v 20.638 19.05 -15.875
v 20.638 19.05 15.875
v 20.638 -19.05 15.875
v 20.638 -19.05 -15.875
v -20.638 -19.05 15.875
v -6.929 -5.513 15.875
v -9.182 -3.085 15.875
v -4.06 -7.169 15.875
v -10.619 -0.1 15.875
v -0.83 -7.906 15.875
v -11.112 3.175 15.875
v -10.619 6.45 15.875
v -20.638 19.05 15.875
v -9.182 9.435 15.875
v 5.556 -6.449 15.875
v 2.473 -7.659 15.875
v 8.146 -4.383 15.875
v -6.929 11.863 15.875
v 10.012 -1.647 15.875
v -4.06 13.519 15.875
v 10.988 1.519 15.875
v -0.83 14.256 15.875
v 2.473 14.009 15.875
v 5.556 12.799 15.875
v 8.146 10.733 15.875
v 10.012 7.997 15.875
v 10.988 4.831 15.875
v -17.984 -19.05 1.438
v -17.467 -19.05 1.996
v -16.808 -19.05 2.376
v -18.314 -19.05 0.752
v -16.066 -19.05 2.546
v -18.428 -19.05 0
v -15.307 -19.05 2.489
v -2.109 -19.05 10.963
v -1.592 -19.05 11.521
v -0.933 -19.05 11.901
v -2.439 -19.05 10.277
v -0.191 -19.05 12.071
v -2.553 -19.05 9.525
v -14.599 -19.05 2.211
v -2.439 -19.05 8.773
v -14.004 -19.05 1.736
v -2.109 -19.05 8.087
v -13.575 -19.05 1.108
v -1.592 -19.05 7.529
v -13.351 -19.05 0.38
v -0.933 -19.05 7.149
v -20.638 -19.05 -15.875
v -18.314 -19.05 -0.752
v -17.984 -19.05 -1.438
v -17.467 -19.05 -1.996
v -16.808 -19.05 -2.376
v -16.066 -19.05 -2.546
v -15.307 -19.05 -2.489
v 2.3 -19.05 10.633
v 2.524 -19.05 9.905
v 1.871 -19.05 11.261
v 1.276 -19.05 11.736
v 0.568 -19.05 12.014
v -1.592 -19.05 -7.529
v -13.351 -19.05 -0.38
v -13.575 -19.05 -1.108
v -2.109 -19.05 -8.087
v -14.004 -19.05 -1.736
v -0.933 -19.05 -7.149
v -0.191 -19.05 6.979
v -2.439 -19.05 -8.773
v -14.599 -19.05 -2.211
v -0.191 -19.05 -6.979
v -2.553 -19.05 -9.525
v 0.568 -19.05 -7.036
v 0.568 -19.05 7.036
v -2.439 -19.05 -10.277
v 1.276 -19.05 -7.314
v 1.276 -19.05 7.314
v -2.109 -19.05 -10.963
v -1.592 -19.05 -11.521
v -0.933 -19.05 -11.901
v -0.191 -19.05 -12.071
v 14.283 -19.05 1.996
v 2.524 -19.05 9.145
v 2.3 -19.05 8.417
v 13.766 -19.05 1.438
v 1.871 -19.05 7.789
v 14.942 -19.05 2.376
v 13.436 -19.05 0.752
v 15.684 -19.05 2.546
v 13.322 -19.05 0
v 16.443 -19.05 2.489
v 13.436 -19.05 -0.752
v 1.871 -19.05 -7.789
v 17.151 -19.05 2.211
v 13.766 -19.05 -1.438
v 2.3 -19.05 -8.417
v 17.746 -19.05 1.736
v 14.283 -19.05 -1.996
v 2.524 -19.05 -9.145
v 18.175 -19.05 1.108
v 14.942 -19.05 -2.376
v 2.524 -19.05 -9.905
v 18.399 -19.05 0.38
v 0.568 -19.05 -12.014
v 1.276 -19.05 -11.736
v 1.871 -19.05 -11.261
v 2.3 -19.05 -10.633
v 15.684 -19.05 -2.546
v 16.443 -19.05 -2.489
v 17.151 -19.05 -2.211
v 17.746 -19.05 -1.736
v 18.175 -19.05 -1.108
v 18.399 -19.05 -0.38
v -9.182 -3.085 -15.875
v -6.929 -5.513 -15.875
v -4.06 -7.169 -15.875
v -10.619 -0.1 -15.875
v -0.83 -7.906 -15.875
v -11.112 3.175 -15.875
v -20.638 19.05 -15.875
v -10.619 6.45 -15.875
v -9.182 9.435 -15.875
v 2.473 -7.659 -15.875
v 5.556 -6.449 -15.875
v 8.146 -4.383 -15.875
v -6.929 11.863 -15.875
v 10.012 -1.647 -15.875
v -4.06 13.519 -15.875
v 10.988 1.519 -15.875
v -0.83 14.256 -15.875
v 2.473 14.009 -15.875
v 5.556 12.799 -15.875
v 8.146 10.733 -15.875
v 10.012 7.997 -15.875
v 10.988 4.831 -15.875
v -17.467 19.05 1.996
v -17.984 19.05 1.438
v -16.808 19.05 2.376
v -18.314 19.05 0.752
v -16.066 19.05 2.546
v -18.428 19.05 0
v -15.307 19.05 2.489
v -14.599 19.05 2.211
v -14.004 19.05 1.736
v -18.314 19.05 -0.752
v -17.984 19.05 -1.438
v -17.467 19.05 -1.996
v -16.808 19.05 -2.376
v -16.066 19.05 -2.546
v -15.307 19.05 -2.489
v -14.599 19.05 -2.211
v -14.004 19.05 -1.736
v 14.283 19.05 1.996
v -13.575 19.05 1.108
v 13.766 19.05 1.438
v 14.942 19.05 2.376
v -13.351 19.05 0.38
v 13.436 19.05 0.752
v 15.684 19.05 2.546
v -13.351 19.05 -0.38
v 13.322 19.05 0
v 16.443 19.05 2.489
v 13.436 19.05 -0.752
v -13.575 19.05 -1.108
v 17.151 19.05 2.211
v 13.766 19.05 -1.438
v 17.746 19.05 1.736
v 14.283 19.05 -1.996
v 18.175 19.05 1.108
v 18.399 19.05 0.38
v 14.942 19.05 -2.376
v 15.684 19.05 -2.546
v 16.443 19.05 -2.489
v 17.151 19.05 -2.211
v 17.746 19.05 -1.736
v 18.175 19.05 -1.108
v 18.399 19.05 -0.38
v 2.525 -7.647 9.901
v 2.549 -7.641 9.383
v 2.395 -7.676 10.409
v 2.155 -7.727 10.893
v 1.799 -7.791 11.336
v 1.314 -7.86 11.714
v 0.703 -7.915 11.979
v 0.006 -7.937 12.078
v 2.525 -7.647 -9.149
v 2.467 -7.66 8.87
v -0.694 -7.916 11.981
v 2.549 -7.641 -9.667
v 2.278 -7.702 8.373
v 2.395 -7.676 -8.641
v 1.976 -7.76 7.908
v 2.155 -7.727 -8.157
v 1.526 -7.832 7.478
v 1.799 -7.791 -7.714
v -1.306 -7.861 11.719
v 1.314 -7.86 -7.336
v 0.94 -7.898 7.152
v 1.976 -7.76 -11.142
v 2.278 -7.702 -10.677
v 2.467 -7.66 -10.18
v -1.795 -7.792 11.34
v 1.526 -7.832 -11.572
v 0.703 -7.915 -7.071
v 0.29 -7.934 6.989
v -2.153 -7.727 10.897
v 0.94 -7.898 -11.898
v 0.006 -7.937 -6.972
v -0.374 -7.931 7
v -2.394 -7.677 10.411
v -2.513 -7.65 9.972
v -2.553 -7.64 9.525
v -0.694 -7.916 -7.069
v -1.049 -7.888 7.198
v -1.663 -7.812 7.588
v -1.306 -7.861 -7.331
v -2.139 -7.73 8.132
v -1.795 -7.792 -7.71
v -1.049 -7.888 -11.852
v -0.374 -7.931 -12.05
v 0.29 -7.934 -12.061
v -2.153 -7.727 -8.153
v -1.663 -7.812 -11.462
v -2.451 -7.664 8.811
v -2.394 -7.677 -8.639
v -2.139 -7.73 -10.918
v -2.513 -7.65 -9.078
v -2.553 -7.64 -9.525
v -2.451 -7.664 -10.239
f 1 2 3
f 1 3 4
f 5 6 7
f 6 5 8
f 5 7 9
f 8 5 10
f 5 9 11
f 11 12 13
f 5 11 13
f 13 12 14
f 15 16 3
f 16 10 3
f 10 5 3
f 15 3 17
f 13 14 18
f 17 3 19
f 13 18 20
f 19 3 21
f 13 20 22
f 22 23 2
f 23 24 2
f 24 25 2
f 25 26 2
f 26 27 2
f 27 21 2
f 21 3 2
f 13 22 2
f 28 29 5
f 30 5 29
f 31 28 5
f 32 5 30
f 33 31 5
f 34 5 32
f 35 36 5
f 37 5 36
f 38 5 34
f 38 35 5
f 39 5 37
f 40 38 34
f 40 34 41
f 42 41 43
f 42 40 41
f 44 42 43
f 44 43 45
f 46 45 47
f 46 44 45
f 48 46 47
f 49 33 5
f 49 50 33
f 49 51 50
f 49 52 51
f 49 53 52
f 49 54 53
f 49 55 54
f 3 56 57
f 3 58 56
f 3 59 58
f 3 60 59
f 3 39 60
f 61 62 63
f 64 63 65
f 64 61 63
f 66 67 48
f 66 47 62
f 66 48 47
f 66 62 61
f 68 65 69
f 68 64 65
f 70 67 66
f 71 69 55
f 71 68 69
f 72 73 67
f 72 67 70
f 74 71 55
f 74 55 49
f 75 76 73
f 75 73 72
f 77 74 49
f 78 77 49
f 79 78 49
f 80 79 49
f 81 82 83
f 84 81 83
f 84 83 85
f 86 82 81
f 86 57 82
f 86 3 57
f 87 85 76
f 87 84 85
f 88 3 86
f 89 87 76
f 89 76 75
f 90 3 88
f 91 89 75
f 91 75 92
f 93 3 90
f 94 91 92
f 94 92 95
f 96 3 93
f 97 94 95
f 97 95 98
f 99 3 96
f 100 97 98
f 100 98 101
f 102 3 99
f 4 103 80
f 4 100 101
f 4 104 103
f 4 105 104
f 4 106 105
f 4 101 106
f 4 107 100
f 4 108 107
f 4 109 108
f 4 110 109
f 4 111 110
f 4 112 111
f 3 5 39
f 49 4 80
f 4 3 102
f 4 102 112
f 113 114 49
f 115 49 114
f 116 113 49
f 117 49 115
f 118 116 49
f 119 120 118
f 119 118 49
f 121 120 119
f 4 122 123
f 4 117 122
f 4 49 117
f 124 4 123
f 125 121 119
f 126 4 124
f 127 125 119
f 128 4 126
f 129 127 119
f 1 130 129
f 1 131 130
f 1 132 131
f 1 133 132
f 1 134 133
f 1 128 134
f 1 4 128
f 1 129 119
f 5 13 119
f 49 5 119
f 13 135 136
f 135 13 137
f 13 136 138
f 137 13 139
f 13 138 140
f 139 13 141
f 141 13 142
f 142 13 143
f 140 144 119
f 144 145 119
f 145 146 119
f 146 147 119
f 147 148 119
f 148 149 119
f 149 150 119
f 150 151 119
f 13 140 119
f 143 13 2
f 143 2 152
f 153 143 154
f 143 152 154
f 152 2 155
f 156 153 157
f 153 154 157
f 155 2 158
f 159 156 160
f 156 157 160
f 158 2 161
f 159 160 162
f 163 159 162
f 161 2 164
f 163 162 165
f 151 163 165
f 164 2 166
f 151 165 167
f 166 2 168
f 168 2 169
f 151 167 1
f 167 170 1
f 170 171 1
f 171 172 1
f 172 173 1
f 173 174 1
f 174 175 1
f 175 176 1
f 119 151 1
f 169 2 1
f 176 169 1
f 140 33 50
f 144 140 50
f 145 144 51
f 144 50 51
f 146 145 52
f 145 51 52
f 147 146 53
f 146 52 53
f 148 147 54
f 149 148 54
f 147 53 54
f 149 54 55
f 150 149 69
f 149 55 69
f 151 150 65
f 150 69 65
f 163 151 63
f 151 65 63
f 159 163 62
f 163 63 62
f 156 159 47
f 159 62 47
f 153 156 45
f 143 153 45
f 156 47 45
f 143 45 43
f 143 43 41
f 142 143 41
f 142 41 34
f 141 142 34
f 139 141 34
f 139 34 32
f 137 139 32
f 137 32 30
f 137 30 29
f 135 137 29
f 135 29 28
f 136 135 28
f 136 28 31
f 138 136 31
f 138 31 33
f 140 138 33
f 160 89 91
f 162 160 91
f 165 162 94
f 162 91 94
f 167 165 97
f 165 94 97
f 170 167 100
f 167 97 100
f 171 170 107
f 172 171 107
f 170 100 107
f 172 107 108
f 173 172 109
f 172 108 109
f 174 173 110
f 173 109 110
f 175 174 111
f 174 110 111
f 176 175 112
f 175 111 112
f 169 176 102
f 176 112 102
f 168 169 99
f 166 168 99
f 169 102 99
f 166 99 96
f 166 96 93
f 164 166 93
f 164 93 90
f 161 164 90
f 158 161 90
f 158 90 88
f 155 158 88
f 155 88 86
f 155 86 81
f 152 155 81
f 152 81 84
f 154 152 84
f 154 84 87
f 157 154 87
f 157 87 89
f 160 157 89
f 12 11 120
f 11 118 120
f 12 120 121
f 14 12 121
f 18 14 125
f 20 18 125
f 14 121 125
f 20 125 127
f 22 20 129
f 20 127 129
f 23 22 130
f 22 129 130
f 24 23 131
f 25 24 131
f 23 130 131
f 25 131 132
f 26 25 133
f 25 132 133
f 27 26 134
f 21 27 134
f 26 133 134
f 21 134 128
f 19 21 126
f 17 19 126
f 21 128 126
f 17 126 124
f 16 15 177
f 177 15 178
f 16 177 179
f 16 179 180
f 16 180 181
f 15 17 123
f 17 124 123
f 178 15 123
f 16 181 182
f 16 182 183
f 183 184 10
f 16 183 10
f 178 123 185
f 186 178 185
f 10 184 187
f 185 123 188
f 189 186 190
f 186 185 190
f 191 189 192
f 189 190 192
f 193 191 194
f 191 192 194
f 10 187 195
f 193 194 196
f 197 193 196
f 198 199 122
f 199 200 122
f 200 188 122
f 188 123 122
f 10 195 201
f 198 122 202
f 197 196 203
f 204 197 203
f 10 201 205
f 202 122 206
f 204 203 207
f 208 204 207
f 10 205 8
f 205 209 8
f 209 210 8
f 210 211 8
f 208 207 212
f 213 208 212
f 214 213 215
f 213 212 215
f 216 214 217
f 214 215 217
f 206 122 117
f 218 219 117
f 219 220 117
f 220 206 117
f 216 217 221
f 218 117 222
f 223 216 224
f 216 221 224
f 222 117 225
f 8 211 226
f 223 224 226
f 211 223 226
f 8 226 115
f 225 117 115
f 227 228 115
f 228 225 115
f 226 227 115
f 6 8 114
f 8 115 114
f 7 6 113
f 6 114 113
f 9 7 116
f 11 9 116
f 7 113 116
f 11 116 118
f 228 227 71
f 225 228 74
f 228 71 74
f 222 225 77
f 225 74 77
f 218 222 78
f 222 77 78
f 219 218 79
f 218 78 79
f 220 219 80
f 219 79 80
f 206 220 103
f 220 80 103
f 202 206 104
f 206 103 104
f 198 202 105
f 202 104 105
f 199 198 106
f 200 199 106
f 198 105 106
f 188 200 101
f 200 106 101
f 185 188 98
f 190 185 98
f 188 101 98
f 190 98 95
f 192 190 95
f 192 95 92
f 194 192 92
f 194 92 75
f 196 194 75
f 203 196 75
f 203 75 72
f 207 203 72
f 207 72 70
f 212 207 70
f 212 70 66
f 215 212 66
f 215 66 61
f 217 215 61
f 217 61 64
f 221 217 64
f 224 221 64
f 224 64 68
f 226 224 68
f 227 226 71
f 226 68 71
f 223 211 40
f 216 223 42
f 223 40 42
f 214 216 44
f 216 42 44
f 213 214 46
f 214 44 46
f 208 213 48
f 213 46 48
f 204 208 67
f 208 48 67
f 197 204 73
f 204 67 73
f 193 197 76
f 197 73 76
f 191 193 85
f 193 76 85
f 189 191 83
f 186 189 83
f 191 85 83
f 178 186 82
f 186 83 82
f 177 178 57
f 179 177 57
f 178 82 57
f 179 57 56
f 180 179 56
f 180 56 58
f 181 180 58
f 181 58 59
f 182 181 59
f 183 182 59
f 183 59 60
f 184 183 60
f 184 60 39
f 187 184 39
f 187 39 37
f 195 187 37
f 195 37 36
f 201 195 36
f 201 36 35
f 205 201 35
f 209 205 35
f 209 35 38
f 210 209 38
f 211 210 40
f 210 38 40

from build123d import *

# Parameters (mm, degrees)
SKETCH1_W                              = 31.75
SKETCH1_H                              = 38.1
BOSS_EXTRUDE1_DEPTH                    = 20.6375
HOLE1_D                                = 22.225
TAPPED_HOLE_FOR_10_32_HELICOIL1_D      = 5.1054
TAPPED_HOLE_FOR_10_32_HELICOIL2_REACH  = 48.147
TAPPED_HOLE_FOR_10_32_HELICOIL2_BORE_R = 2.5527


with BuildPart() as part:
    # Sketch1 → Boss-Extrude1 (new, symmetric)
    with BuildSketch(Plane(origin=(0, 0, 0), x_dir=(0, 0, -1), z_dir=(1, 0, 0))):
        Rectangle(SKETCH1_W, SKETCH1_H)
    extrude(amount=BOSS_EXTRUDE1_DEPTH, both=True)

    # Hole1 (through all)
    with Locations(Plane.XY.offset(15.875)):
        with Locations((0, 3.175)):
            Hole(HOLE1_D / 2)

    # Tapped Hole for #10-32 Helicoil1 (through all)
    with Locations(Plane(origin=(0, 19.05, 0), x_dir=(1, 0, 0), z_dir=(0, 1, 0))):
        with Locations((-15.875, 0), (15.875, 0)):
            Hole(TAPPED_HOLE_FOR_10_32_HELICOIL1_D / 2)

    # Tapped Hole for #10-32 Helicoil2 bore → Tapped Hole for #10-32 Helicoil2 (cut, up to next)
    with BuildSketch(Plane(origin=(0, -19.05, 0), x_dir=(-1, 0, 0), z_dir=(0, -1, 0)), mode=Mode.PRIVATE) as tapped_hole_for_10_32_helicoil2_sk1:
        with Locations((0, 9.525)):
            Circle(TAPPED_HOLE_FOR_10_32_HELICOIL2_BORE_R)
    tapped_hole_for_10_32_helicoil2_tool1 = extrude(tapped_hole_for_10_32_helicoil2_sk1.sketch, amount=-TAPPED_HOLE_FOR_10_32_HELICOIL2_REACH, mode=Mode.PRIVATE) & part.part
    # Tapped Hole for #10-32 Helicoil2 bore → Tapped Hole for #10-32 Helicoil2 (cut, up to next)
    with BuildSketch(Plane(origin=(0, -19.05, 0), x_dir=(-1, 0, 0), z_dir=(0, -1, 0)), mode=Mode.PRIVATE) as tapped_hole_for_10_32_helicoil2_sk2:
        with Locations((0, -9.525)):
            Circle(TAPPED_HOLE_FOR_10_32_HELICOIL2_BORE_R)
    tapped_hole_for_10_32_helicoil2_tool2 = extrude(tapped_hole_for_10_32_helicoil2_sk2.sketch, amount=-TAPPED_HOLE_FOR_10_32_HELICOIL2_REACH, mode=Mode.PRIVATE) & part.part
    add(tapped_hole_for_10_32_helicoil2_tool1.solids().sort_by_distance((0, -19.05, -9.525))[0], mode=Mode.SUBTRACT)
    add(tapped_hole_for_10_32_helicoil2_tool2.solids().sort_by_distance((0, -19.05, 9.525))[0], mode=Mode.SUBTRACT)


solid = part.part
